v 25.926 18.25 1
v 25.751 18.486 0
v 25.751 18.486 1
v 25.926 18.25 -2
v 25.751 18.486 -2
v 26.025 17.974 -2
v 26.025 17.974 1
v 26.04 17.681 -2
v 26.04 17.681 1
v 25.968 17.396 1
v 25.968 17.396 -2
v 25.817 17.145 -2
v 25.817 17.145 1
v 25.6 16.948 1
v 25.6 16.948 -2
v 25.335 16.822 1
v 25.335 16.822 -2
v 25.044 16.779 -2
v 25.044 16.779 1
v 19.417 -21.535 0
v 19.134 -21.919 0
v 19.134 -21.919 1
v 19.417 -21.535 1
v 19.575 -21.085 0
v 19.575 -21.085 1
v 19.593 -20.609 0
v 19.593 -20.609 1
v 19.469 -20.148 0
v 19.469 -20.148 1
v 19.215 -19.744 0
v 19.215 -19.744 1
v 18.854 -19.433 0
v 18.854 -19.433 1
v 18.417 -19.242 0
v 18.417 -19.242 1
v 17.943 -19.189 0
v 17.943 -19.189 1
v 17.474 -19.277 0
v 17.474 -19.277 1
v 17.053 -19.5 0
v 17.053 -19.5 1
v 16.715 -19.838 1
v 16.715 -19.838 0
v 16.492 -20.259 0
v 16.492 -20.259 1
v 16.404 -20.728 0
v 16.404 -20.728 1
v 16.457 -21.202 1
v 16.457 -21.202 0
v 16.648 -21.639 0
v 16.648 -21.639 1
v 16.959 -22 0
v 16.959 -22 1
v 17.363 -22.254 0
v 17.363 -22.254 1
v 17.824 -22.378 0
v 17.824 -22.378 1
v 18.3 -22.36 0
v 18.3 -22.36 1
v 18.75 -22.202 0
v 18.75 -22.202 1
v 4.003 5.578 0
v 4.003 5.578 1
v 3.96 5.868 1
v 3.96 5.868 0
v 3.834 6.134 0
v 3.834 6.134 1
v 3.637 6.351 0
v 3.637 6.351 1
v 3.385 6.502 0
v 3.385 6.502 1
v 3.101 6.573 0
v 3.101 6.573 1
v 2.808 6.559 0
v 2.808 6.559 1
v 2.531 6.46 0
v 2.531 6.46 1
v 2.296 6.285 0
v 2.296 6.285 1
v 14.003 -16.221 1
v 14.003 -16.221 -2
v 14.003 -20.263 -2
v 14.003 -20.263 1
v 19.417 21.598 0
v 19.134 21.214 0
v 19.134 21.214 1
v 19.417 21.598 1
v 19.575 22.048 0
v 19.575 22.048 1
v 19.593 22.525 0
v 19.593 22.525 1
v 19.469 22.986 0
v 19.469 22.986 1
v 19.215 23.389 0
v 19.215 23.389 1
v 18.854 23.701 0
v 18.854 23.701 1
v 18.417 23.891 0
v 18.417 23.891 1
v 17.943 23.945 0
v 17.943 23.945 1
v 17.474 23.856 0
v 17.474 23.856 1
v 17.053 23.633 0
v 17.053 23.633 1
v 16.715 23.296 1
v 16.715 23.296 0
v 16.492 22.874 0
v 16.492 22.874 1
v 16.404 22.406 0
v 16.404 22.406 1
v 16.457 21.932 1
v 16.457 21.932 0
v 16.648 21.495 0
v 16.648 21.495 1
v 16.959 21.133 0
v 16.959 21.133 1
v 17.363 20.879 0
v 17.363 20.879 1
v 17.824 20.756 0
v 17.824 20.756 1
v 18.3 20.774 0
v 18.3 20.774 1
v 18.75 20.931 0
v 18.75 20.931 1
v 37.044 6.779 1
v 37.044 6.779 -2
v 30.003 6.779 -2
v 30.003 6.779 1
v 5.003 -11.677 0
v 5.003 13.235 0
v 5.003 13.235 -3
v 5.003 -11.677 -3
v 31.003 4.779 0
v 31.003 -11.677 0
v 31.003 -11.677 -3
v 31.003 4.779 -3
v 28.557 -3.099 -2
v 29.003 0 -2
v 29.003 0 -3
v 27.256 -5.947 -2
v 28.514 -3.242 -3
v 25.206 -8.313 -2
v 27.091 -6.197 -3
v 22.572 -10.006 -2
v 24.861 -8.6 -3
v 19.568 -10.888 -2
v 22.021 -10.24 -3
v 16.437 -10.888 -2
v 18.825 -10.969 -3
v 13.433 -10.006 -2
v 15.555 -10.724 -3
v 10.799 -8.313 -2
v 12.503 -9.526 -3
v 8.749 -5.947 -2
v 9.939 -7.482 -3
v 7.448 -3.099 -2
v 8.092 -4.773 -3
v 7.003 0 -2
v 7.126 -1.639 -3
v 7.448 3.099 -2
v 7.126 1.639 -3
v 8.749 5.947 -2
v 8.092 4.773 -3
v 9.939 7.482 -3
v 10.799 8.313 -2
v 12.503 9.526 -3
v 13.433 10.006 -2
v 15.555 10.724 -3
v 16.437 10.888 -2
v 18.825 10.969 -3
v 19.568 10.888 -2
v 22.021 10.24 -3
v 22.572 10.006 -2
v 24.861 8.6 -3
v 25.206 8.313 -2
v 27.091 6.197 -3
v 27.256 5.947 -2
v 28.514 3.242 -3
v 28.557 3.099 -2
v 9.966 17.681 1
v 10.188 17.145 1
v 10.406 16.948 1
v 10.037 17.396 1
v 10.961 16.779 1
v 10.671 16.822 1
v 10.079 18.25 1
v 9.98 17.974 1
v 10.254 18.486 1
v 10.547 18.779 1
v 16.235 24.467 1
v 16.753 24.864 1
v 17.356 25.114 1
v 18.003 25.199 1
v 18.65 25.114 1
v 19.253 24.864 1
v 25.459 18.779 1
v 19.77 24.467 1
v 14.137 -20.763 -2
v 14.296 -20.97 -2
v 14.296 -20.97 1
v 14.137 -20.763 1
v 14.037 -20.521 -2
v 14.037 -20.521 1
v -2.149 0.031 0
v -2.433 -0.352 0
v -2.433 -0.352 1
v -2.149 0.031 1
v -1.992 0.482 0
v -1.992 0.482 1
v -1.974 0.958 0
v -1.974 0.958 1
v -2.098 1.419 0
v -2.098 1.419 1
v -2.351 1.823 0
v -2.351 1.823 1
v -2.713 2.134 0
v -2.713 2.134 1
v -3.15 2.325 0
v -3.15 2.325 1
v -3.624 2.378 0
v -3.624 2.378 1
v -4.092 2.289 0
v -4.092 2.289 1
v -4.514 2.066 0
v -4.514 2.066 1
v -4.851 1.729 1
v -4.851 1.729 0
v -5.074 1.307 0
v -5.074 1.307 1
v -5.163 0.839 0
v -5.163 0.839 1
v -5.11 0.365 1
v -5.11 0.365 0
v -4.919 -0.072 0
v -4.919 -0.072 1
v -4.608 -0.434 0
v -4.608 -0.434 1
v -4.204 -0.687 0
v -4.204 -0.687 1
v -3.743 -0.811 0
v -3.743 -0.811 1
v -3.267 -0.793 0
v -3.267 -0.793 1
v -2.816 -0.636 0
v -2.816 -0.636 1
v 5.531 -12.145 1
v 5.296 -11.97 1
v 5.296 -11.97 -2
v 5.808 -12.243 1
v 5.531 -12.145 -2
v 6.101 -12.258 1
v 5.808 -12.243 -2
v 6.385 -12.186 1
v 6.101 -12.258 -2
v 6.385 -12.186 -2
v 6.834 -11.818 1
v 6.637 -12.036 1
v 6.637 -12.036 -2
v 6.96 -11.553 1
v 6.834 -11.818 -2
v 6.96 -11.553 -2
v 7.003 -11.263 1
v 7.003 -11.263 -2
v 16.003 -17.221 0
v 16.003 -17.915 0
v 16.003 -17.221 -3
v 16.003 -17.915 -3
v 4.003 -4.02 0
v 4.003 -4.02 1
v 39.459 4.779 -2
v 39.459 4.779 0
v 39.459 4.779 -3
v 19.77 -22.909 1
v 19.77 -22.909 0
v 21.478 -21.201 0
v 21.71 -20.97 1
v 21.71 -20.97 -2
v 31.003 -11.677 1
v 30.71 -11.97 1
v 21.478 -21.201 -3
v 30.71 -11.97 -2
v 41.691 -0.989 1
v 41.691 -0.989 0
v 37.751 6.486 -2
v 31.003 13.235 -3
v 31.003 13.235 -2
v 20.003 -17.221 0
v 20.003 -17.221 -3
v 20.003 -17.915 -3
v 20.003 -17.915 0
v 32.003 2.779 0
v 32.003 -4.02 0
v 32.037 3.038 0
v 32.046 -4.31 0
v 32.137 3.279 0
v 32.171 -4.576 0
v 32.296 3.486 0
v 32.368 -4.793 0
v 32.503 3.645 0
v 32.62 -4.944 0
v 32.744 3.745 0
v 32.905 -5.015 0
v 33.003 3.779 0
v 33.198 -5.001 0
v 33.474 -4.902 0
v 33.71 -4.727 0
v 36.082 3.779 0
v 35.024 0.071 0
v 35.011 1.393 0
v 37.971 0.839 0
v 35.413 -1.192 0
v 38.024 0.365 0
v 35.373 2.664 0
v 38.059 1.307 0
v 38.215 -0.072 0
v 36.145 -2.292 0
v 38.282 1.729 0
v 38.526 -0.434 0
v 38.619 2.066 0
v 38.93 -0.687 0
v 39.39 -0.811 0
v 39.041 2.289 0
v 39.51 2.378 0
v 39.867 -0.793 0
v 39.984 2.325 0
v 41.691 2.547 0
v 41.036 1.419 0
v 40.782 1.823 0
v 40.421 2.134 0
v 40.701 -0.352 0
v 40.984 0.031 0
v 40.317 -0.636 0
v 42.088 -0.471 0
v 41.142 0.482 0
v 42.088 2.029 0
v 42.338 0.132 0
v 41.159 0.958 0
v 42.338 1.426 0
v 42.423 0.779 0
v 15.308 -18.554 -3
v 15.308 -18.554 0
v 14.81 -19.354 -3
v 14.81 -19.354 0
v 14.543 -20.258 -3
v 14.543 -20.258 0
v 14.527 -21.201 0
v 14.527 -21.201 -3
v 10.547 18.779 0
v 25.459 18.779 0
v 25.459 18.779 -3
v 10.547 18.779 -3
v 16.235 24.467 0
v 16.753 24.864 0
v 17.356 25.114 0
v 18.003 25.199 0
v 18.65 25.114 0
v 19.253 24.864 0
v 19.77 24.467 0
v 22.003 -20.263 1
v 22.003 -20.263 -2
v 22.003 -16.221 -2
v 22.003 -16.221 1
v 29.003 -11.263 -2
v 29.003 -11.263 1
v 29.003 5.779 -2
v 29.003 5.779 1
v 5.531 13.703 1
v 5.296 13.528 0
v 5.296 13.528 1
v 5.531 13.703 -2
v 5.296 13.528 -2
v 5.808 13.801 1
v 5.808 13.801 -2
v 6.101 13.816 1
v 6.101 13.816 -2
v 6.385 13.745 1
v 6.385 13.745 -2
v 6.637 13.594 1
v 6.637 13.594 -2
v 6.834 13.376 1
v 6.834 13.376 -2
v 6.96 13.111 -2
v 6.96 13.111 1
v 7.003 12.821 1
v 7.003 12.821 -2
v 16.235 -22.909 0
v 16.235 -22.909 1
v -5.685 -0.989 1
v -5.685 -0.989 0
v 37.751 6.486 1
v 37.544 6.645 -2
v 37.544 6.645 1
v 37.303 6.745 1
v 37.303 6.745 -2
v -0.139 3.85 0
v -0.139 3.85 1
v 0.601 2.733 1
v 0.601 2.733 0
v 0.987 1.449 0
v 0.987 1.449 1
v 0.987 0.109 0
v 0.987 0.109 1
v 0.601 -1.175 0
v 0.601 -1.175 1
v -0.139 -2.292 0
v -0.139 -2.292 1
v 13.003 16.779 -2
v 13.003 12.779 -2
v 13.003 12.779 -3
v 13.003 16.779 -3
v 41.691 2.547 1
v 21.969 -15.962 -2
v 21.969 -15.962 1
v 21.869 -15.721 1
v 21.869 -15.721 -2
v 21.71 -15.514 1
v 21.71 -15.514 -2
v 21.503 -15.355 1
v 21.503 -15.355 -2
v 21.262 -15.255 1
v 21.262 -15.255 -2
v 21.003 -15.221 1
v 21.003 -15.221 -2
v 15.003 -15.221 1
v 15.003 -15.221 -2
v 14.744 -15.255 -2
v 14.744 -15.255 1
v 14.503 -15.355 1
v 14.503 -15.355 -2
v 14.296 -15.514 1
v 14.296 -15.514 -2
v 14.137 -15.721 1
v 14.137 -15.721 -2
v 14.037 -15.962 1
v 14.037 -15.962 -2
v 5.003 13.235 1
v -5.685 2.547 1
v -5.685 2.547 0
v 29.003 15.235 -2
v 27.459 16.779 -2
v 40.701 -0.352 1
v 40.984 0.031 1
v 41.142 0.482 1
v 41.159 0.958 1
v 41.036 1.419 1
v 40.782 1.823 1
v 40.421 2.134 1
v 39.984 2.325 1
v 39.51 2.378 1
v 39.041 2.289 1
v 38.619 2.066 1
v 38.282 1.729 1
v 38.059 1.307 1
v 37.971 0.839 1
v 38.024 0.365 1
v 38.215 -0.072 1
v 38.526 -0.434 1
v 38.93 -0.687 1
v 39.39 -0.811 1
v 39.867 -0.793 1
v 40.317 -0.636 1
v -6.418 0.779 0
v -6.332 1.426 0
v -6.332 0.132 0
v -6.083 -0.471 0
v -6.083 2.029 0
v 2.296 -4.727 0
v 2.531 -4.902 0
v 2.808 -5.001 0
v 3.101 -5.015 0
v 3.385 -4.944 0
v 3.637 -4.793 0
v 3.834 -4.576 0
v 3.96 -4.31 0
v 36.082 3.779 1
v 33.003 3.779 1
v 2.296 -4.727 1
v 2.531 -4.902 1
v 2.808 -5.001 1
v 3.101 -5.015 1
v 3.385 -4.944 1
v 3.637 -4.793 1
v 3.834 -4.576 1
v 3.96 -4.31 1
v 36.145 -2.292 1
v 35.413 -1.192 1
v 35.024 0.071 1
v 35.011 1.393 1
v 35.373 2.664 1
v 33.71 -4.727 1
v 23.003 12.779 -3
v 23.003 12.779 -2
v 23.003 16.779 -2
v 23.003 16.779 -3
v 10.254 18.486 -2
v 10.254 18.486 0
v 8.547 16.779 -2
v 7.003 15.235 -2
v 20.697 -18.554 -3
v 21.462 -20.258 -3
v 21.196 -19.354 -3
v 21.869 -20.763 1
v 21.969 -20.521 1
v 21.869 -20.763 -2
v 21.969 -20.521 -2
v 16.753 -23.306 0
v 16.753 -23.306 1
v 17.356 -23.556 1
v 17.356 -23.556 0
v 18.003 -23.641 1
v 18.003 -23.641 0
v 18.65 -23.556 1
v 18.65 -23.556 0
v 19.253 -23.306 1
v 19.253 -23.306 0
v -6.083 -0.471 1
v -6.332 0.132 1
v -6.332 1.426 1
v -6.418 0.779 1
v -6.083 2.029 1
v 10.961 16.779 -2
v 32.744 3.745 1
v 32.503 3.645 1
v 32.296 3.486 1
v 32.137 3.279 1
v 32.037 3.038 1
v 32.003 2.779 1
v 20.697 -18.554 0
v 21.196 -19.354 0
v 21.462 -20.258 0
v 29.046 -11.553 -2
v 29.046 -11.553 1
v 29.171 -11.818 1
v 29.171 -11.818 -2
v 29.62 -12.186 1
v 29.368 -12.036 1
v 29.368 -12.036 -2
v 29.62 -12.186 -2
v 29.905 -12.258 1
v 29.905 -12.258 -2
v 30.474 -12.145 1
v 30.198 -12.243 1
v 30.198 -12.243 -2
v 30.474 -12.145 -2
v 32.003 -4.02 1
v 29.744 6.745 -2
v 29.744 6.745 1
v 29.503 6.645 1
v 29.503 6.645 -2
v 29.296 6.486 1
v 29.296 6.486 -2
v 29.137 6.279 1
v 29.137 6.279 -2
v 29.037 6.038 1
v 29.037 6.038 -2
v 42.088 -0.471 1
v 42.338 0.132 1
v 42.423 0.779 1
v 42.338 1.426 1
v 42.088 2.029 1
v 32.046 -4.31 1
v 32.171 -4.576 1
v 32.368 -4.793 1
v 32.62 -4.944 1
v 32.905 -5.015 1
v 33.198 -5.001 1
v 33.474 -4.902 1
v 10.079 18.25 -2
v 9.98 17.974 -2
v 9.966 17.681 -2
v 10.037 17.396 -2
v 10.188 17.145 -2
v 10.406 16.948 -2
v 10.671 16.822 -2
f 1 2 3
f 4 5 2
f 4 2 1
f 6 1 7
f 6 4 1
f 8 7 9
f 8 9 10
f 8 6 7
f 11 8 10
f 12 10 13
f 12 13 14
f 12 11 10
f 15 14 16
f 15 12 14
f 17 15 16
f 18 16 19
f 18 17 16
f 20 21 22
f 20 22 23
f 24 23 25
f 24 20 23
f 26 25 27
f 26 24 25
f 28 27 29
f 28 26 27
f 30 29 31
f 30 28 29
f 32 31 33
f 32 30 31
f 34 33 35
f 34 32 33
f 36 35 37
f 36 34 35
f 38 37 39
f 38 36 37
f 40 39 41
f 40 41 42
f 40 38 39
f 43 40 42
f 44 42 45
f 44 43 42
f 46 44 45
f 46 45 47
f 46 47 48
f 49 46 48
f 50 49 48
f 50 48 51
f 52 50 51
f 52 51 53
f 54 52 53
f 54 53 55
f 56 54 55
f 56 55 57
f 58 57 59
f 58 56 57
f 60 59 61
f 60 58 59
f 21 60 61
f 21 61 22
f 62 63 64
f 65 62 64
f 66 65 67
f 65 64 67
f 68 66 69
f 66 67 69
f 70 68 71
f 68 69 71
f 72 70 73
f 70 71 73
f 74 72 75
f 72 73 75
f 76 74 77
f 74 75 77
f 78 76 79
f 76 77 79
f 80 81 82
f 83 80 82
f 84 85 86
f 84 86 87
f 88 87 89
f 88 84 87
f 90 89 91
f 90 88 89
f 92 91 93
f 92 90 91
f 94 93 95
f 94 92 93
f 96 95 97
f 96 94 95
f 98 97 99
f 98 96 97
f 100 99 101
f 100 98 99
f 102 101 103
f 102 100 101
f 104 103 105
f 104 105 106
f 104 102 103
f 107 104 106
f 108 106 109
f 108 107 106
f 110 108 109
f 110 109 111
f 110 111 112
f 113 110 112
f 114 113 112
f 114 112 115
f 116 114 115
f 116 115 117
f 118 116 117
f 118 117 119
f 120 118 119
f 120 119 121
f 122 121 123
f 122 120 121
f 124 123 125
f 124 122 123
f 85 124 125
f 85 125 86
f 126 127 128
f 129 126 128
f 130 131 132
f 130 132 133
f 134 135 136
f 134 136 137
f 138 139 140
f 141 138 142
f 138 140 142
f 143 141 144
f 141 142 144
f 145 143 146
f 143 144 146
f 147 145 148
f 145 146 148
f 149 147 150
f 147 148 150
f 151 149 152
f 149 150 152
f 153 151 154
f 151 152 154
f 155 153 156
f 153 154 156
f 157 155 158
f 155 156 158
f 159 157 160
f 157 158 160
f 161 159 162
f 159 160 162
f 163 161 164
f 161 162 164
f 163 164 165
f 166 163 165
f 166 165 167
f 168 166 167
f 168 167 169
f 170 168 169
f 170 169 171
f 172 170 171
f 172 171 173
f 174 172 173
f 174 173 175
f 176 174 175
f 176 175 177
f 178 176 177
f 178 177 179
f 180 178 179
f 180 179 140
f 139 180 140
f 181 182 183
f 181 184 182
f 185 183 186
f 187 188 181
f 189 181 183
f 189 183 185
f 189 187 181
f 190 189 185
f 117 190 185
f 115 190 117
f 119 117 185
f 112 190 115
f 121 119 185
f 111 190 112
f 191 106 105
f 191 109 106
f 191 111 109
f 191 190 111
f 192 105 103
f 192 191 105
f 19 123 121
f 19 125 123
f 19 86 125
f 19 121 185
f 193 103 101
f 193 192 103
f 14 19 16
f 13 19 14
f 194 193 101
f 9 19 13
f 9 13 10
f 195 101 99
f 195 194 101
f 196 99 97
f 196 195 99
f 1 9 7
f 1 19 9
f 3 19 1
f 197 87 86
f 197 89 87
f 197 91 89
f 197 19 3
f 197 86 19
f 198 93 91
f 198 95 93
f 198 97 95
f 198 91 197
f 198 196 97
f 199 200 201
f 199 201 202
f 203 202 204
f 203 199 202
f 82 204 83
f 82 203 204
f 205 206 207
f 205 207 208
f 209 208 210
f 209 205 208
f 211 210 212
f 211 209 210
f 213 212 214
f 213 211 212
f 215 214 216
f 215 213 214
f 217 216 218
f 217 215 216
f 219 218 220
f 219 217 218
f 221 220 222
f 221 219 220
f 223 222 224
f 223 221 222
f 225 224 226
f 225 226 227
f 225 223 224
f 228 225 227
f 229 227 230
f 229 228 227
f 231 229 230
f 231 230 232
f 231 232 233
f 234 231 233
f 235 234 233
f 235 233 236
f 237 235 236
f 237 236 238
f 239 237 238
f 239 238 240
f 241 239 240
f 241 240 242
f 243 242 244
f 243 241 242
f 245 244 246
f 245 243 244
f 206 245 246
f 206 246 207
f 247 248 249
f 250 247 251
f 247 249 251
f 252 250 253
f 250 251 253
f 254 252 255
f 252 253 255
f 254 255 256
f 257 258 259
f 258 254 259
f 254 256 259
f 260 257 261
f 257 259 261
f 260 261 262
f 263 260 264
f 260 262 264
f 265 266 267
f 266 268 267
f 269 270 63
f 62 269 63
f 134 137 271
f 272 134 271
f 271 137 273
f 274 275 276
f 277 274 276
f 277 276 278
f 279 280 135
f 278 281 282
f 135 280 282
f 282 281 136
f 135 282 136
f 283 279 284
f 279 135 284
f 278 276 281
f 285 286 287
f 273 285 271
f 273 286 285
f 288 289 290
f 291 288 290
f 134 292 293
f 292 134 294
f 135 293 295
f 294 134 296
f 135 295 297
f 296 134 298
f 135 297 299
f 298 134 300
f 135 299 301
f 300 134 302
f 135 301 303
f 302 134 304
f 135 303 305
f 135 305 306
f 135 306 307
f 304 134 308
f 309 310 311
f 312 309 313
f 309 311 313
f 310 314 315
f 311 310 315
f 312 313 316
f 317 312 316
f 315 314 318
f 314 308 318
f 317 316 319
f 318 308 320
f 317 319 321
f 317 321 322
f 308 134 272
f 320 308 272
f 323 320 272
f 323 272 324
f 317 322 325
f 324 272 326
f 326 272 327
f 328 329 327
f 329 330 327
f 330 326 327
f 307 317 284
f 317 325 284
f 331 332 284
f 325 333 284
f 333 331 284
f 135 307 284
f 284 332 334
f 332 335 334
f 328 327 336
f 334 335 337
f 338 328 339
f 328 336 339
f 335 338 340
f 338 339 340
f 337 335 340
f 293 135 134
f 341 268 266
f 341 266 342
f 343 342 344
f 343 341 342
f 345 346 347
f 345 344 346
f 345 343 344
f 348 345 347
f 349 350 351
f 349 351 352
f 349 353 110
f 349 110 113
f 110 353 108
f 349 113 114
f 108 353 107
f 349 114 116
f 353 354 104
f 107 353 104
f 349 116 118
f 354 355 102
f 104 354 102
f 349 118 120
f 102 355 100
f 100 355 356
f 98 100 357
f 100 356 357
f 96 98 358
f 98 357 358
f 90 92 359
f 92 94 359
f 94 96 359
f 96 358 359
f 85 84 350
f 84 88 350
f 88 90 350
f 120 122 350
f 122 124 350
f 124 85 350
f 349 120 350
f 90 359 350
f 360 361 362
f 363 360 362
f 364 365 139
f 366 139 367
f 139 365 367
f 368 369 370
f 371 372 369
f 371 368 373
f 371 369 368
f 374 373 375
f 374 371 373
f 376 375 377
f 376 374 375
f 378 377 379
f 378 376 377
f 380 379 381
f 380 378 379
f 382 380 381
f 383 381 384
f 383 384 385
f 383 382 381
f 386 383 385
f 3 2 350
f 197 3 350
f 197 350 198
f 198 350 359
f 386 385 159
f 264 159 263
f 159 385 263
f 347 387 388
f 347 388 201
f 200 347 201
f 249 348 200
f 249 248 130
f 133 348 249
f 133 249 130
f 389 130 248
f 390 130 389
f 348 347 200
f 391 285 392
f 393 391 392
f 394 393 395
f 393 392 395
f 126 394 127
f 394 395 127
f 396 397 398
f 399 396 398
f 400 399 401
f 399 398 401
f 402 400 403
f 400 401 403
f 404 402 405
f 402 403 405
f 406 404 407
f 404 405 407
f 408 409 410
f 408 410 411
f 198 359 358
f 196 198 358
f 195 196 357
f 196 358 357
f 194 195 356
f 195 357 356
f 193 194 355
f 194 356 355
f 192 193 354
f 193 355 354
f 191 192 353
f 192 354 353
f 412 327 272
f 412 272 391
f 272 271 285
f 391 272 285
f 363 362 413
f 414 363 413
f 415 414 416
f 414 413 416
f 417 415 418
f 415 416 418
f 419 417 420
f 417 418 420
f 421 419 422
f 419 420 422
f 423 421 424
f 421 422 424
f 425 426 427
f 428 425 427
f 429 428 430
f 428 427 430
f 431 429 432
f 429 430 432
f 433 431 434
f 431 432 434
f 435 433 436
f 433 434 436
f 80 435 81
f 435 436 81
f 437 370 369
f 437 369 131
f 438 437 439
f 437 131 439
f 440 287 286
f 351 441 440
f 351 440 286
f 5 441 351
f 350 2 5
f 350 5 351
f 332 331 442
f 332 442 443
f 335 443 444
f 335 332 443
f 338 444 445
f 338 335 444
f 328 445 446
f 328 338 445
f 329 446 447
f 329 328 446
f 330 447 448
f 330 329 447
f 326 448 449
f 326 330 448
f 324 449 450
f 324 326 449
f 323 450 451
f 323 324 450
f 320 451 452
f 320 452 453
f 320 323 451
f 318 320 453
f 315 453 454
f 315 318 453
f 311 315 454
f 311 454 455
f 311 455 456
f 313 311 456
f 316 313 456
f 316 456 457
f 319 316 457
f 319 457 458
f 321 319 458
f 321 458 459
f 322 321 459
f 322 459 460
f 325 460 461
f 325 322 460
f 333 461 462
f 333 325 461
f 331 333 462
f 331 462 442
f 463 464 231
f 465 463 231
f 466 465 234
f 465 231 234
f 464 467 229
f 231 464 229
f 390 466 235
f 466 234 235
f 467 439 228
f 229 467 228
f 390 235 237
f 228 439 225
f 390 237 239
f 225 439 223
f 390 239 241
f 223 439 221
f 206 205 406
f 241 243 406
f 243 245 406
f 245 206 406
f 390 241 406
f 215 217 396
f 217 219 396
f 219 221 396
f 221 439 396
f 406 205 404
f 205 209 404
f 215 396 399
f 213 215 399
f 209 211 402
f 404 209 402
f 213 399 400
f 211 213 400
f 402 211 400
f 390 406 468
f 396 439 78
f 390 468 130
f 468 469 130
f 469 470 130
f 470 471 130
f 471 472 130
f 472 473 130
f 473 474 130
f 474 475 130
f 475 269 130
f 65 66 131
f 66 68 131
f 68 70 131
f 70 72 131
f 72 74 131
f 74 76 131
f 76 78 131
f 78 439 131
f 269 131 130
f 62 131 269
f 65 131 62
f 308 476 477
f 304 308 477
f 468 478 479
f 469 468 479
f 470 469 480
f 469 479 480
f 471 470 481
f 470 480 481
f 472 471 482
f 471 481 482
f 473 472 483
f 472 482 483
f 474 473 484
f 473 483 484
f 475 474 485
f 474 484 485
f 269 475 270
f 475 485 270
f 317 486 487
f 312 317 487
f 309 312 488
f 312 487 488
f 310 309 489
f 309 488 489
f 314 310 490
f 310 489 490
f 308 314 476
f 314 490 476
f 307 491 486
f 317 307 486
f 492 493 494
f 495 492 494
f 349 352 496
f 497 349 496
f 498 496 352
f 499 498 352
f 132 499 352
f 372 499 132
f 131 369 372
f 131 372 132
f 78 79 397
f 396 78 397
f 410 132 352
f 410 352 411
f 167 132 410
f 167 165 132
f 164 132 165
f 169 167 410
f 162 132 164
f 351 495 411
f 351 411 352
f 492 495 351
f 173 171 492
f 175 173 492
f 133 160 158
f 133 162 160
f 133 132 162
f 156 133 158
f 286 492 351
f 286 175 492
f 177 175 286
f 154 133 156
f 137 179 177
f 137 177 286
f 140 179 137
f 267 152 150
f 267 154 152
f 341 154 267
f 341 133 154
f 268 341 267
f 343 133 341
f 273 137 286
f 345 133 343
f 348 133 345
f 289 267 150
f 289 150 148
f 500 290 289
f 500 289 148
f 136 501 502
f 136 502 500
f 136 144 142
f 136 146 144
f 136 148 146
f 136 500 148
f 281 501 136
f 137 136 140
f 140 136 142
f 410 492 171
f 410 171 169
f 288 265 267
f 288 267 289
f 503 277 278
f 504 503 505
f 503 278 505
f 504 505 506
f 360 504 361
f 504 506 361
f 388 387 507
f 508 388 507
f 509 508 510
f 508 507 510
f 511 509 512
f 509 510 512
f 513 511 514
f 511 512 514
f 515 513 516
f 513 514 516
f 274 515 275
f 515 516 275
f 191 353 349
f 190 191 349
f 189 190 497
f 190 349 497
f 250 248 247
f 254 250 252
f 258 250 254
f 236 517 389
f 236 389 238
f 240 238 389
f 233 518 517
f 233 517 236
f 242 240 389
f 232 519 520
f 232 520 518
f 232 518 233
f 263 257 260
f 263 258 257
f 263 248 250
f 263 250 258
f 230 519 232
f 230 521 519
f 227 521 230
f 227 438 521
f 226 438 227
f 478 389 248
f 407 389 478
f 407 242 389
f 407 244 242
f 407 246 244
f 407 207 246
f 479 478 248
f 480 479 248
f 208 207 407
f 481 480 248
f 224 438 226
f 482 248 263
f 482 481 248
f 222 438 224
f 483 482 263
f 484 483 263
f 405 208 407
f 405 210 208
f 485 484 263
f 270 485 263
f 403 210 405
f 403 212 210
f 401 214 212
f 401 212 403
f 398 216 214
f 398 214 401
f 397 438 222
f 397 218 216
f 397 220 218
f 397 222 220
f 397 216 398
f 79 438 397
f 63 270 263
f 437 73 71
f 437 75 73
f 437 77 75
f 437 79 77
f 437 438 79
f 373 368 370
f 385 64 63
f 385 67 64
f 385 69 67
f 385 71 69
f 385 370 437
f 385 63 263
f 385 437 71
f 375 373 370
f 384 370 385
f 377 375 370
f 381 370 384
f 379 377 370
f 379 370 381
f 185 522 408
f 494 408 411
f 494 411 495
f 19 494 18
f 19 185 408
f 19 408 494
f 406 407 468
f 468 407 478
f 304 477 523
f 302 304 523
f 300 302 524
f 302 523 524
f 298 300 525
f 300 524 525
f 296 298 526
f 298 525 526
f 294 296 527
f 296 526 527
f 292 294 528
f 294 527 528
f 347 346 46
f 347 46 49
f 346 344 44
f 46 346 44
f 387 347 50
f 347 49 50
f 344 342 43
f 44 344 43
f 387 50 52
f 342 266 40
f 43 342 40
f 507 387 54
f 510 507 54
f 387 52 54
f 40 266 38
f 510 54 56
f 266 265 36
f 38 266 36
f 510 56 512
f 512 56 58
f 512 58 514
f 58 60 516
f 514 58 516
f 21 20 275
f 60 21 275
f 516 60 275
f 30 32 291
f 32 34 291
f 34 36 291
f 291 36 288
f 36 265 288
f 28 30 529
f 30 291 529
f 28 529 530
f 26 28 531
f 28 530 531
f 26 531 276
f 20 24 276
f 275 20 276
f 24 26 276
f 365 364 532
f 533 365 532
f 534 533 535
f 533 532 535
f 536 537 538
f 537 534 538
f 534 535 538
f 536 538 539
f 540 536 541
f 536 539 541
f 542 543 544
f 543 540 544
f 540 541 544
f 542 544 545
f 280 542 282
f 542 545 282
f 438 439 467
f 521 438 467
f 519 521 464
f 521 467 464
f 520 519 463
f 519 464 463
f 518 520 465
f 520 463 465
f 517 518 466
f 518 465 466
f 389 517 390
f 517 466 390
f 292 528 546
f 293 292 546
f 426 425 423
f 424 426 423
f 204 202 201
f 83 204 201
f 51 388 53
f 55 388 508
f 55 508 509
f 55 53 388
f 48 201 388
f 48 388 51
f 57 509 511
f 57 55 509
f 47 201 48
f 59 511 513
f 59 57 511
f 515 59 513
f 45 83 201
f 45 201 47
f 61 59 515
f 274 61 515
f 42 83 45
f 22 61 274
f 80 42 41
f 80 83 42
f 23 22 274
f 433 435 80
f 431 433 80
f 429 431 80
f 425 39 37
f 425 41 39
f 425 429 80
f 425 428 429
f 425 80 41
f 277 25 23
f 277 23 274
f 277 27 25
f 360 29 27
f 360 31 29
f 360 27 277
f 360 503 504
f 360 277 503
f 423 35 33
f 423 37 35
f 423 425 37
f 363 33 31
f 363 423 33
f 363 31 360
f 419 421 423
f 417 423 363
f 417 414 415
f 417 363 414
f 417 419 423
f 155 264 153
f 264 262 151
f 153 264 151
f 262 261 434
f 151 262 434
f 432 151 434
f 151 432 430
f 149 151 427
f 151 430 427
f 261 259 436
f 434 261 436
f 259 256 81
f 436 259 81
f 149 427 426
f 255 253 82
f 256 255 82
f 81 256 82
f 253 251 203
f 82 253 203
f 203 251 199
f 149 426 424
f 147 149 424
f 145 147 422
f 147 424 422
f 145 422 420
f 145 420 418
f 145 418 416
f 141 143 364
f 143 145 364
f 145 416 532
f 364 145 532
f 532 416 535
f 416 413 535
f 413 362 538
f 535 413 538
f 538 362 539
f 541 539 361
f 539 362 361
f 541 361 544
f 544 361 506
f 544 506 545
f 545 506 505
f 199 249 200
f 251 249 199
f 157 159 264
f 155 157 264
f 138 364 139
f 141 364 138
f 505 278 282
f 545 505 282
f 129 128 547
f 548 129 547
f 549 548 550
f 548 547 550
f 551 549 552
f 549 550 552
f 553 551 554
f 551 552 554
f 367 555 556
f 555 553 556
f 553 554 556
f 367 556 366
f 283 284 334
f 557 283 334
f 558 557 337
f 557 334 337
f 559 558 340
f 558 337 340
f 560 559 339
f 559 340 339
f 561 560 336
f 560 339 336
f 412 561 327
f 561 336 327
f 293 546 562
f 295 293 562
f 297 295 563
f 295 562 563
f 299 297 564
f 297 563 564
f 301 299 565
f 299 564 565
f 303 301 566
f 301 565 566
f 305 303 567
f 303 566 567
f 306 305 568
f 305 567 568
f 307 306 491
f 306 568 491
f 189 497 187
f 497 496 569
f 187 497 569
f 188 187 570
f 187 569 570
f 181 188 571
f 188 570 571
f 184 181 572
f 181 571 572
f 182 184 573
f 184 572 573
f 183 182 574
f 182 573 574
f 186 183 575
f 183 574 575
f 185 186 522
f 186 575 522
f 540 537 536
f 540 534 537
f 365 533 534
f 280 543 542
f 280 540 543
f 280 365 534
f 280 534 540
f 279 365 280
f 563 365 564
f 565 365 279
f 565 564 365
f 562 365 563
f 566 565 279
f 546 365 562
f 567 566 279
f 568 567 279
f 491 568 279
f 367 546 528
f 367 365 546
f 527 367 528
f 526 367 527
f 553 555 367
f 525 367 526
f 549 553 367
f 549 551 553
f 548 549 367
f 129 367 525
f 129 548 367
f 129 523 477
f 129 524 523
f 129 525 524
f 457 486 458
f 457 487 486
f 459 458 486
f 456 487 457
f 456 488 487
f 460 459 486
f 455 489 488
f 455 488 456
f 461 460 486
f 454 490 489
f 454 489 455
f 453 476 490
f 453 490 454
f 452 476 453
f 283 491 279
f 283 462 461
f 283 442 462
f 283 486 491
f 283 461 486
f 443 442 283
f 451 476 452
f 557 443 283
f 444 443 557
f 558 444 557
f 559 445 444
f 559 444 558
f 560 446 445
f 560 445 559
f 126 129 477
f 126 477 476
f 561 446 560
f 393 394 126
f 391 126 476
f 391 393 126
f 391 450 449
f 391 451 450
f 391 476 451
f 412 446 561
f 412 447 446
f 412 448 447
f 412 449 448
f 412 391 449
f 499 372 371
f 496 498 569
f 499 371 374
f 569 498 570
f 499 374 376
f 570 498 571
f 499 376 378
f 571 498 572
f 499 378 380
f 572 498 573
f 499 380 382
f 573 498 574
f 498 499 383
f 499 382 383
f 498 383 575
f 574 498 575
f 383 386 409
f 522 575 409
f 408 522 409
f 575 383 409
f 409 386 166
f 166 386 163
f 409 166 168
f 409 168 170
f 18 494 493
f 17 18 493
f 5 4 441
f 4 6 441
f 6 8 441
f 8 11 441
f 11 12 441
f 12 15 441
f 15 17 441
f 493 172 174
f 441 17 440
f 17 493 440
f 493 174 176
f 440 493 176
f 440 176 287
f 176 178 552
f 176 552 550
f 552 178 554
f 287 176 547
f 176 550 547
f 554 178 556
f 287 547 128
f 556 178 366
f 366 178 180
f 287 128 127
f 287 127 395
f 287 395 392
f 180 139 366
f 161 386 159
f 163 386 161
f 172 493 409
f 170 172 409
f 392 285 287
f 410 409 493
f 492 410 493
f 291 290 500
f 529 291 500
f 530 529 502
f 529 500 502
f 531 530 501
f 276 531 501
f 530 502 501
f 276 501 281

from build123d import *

# Parameters (mm, degrees)
F0_R         = 1.6
F1_DEPTH     = 1
F2_ANGLE     = 45
F3_DEPTH     = 4
F5_DEPTH     = 3
F20_DEPTH    = 3
F7_R         = 11
F8_DEPTH     = 25
F9_DEPTH     = 3
F10_W        = 10
F10_H        = 4
F11_DEPTH    = 25
F13_DEPTH    = 25
F14_DEPTH    = 1
F15_DEPTH    = 2
F16_DEPTH    = 1
F17_DEPTH    = 2
F18_T1_DEPTH = 5.5
F18_T3_DEPTH = 9.0355339059
F18_T5_DEPTH = 4.0355339059


# Not quite as in the source:
# - a fillet or chamfer that OpenCascade refuses, or shapes differently, is made with other operations: its cross-section is extruded or revolved along the edge and cut away or added


with BuildPart() as f1:
    # F0 (on Top) → F1 (new body)
    with BuildSketch(Plane.XY):
        with BuildLine():
            Line((-14.7650561035, -22.9090262799), (16.2349438965, -22.9090262799))
            ThreePointArc((16.2349438965, -22.9090262799), (18.0027108495, -22.1767932329), (18.7349438965, -20.4090262799))
            Line((18.7349438965, -20.4090262799), (18.7349438965, 10.5909737201))
            ThreePointArc((18.7349438965, 10.5909737201), (18.0027108495, 12.3587406731), (16.2349438965, 13.0909737201))
            Line((16.2349438965, 13.0909737201), (-14.7650561035, 13.0909737201))
            ThreePointArc((-14.7650561035, 13.0909737201), (-16.5328230564, 12.3587406731), (-17.2650561035, 10.5909737201))
            Line((-17.2650561035, 10.5909737201), (-17.2650561035, -20.4090262799))
            ThreePointArc((-17.2650561035, -20.4090262799), (-16.5328230564, -22.1767932329), (-14.7650561035, -22.9090262799))
        make_face()
        with Locations((-14.5150561035, -20.1590262799)):
            Circle(F0_R, mode=Mode.SUBTRACT)
        with Locations((15.9849438965, -20.1590262799)):
            Circle(F0_R, mode=Mode.SUBTRACT)
        with Locations((-14.5150561035, 10.3409737201)):
            Circle(F0_R, mode=Mode.SUBTRACT)
        with Locations((15.9849438965, 10.3409737201)):
            Circle(F0_R, mode=Mode.SUBTRACT)
    extrude(amount=F1_DEPTH)


with BuildPart() as f1_1:
    # F2: moved
    add(f1.part.rotate(Axis((16.2349438965, -22.9090262799, 0.5), (0, 0, -1)), F2_ANGLE))

    # F19 (on face) → F3 (join)
    with BuildSketch(Plane.XY.offset(1)):
        Polygon((10.5468667268, -17.2209491102), (25.4585549722, -17.2209491102), (31.0027108495, -11.6767932329), (31.0027108495, 13.2348950126), (25.4585549722, 18.7790508898), (10.5468667268, 18.7790508898), (5.0027108495, 13.2348950126), (5.0027108495, -11.6767932329), align=None)
    extrude(amount=-F3_DEPTH)

    # F4 (on face) → F5 (cut)
    with BuildSketch(Plane.XY.offset(1)):
        Polygon((8.5468667268, -15.2209491102), (27.4585549722, -15.2209491102), (29.0027108495, -13.6767932329), (29.0027108495, 15.2348950126), (27.4585549722, 16.7790508898), (8.5468667268, 16.7790508898), (7.0027108495, 15.2348950126), (7.0027108495, -13.6767932329), align=None)
    extrude(amount=-F5_DEPTH, mode=Mode.SUBTRACT)

    # F6 (on face) → F20 (cut, through all)
    with BuildSketch(Plane.XY.offset(1)):
        Polygon((14.0027108495, -20.6767932329), (14.0027108495, -15.2209491102), (8.5468667268, -15.2209491102), align=None)
        Polygon((27.4585549722, -15.2209491102), (22.0027108495, -15.2209491102), (22.0027108495, -20.6767932329), align=None)
    extrude(amount=-F20_DEPTH, mode=Mode.SUBTRACT)

    # F7 (on face) → F8 (cut)
    with BuildSketch(Plane(origin=(0, 0, -3), x_dir=(1, 0, 0), z_dir=(0, 0, -1))):
        with Locations((18.0027108495, 0)):
            Circle(F7_R)
    extrude(amount=-F8_DEPTH, mode=Mode.SUBTRACT)

    # F21 (on face) → F9 (cut, through all)
    with BuildSketch(Plane.XY.offset(1)):
        Polygon((29.0027108495, 15.2348950126), (29.0027108495, 6.7790508898), (37.4585549722, 6.7790508898), align=None)
    extrude(amount=-F9_DEPTH, mode=Mode.SUBTRACT)

    # F10 (on face) → F11 (cut)
    with BuildSketch(Plane.XY.offset(-2)):
        with Locations((18.0027108495, 14.7790508898)):
            Rectangle(F10_W, F10_H)
    extrude(amount=-F11_DEPTH, mode=Mode.SUBTRACT)

    # F12 (on face) + F22 (on face) → F13 (cut)
    with BuildSketch(Plane.XY.offset(1)):
        with BuildLine():
            ThreePointArc((36.1448070539, -2.2920563414), (34.9697110872, 0.7317293655), (36.0823485209, 3.7790508898))
            Line((36.0823485209, 3.7790508898), (33.0027108495, 3.7790508898))
            ThreePointArc((33.0027108495, 3.7790508898), (32.2956040683, 3.486157671), (32.0027108495, 2.7790508898))
            Line((32.0027108495, 2.7790508898), (32.0027108495, -4.0199389834))
            ThreePointArc((32.0027108495, -4.0199389834), (32.6200274171, -4.9438185159), (33.7098176307, -4.7270457646))
            Line((33.7098176307, -4.7270457646), (36.1448070539, -2.2920563414))
        make_face()
    with BuildSketch(Plane.XY.offset(1)):
        with BuildLine():
            ThreePointArc((-0.1393853549, 3.8501581211), (1.0359540233, 0.7790508898), (-0.1393853549, -2.2920563414))
            Line((-0.1393853549, -2.2920563414), (2.2956040683, -4.7270457646))
            ThreePointArc((2.2956040683, -4.7270457646), (3.3853942819, -4.9438185159), (4.0027108495, -4.0199389834))
            Line((4.0027108495, -4.0199389834), (4.0027108495, 5.5780407631))
            ThreePointArc((4.0027108495, 5.5780407631), (3.3853942819, 6.5019202956), (2.2956040683, 6.2851475443))
            Line((2.2956040683, 6.2851475443), (-0.1393853549, 3.8501581211))
        make_face()
    extrude(amount=-F13_DEPTH, mode=Mode.SUBTRACT)

    # F23 (on face) → F14 (join, through all)
    with BuildSketch(Plane(origin=(0, 0, -3), x_dir=(1, 0, 0), z_dir=(0, 0, -1))):
        with BuildLine():
            Line((14.527236112, 21.2013184954), (10.5468667268, 17.2209491102))
            Line((10.5468667268, 17.2209491102), (16.0027108495, 17.2209491102))
            Line((16.0027108495, 17.2209491102), (16.0027108495, 17.9154246131))
            ThreePointArc((16.0027108495, 17.9154246131), (14.809831185, 19.3539976507), (14.527236112, 21.2013184954))
        make_face()
        with BuildLine():
            Line((20.0027108495, 17.9154246131), (20.0027108495, 17.2209491102))
            Line((20.0027108495, 17.2209491102), (25.4585549722, 17.2209491102))
            Line((25.4585549722, 17.2209491102), (21.478185587, 21.2013184954))
            ThreePointArc((21.478185587, 21.2013184954), (21.195590514, 19.3539976507), (20.0027108495, 17.9154246131))
        make_face()
    extrude(amount=-F14_DEPTH)

    # F24 (on face) → F15 (join, through all)
    with BuildSketch(Plane.XY.offset(-2)):
        with BuildLine():
            Line((22.0027108495, -20.6767932329), (22.0027108495, -17.2209491102))
            Line((22.0027108495, -17.2209491102), (20.0027108495, -17.2209491102))
            Line((20.0027108495, -17.2209491102), (20.0027108495, -17.9154246131))
            ThreePointArc((20.0027108495, -17.9154246131), (21.195590514, -19.3539976507), (21.478185587, -21.2013184954))
            Line((21.478185587, -21.2013184954), (22.0027108495, -20.6767932329))
        make_face()
        with BuildLine():
            Line((16.0027108495, -17.2209491102), (14.0027108495, -17.2209491102))
            Line((14.0027108495, -17.2209491102), (14.0027108495, -20.6767932329))
            Line((14.0027108495, -20.6767932329), (14.527236112, -21.2013184954))
            ThreePointArc((14.527236112, -21.2013184954), (14.809831185, -19.3539976507), (16.0027108495, -17.9154246131))
            Line((16.0027108495, -17.9154246131), (16.0027108495, -17.2209491102))
        make_face()
    extrude(amount=F15_DEPTH)

    # F25 (on face) → F16 (join, through all)
    with BuildSketch(Plane(origin=(0, 0, -3), x_dir=(1, 0, 0), z_dir=(0, 0, -1))):
        Polygon((31.0027108495, -4.7790508898), (31.0027108495, -13.2348950126), (39.4585549722, -4.7790508898), align=None)
    extrude(amount=-F16_DEPTH)

    # F26 (on face) → F17 (join, through all)
    with BuildSketch(Plane.XY.offset(-2)):
        Polygon((37.4585549722, 6.7790508898), (31.0027108495, 6.7790508898), (31.0027108495, 4.7790508898), (39.4585549722, 4.7790508898), align=None)
    extrude(amount=F17_DEPTH)

    # F18: fillet of radius 1 on 11 edges, made by hand

    # F18_s2 → F18_t1 (cut)
    with BuildSketch(Plane.XY.offset(-2)):
        with BuildLine():
            ThreePointArc((22.0027108495, -16.2209491102), (21.7098176307, -15.513842329), (21.0027108495, -15.2209491102))
            Line((21.0027108495, -15.2209491102), (22.0027108495, -15.2209491102))
            Line((22.0027108495, -15.2209491102), (22.0027108495, -16.2209491102))
        make_face()
        with BuildLine():
            ThreePointArc((15.0027108495, -15.2209491102), (14.2956040683, -15.513842329), (14.0027108495, -16.2209491102))
            Line((14.0027108495, -16.2209491102), (14.0027108495, -15.2209491102))
            Line((14.0027108495, -15.2209491102), (15.0027108495, -15.2209491102))
        make_face()
        with BuildLine():
            ThreePointArc((30.0027108495, 6.7790508898), (29.2956040683, 6.486157671), (29.0027108495, 5.7790508898))
            Line((29.0027108495, 5.7790508898), (29.0027108495, 6.7790508898))
            Line((29.0027108495, 6.7790508898), (30.0027108495, 6.7790508898))
        make_face()
    extrude(amount=F18_T1_DEPTH, mode=Mode.SUBTRACT)

    # F18_s4 → F18_t3 (cut)
    with BuildSketch(Plane.XY.offset(-2)):
        with BuildLine():
            ThreePointArc((5.2956040683, -11.9696864517), (6.3853942819, -12.186459203), (7.0027108495, -11.2625796705))
            Line((7.0027108495, -11.2625796705), (7.0027108495, -13.6767932329))
            Line((7.0027108495, -13.6767932329), (5.2956040683, -11.9696864517))
        make_face()
        with BuildLine():
            ThreePointArc((5.2956040683, 13.5277882314), (6.3853942819, 13.7445609827), (7.0027108495, 12.8206814502))
            Line((7.0027108495, 12.8206814502), (7.0027108495, 15.2348950126))
            Line((7.0027108495, 15.2348950126), (5.2956040683, 13.5277882314))
        make_face()
        with BuildLine():
            ThreePointArc((29.0027108495, -11.2625796705), (29.6200274171, -12.186459203), (30.7098176307, -11.9696864517))
            Line((30.7098176307, -11.9696864517), (29.0027108495, -13.6767932329))
            Line((29.0027108495, -13.6767932329), (29.0027108495, -11.2625796705))
        make_face()
        with BuildLine():
            ThreePointArc((10.253973508, 18.486157671), (10.0372007566, 17.3963674575), (10.9610802892, 16.7790508898))
            Line((10.9610802892, 16.7790508898), (8.5468667268, 16.7790508898))
            Line((8.5468667268, 16.7790508898), (10.253973508, 18.486157671))
        make_face()
        with BuildLine():
            ThreePointArc((25.751448191, 18.486157671), (25.9682209424, 17.3963674575), (25.0443414098, 16.7790508898))
            Line((25.0443414098, 16.7790508898), (27.4585549722, 16.7790508898))
            Line((27.4585549722, 16.7790508898), (25.751448191, 18.486157671))
        make_face()
    extrude(amount=F18_T3_DEPTH, mode=Mode.SUBTRACT)

    # F18_s6 → F18_t5 (cut)
    with BuildSketch(Plane.XY.offset(-2)):
        with BuildLine():
            ThreePointArc((14.2956040683, -20.9696864517), (14.078831317, -20.6452631029), (14.0027108495, -20.2625796705))
            Line((14.0027108495, -20.2625796705), (14.0027108495, -20.6767932329))
            Line((14.0027108495, -20.6767932329), (14.2956040683, -20.9696864517))
        make_face()
        with BuildLine():
            ThreePointArc((21.7098176307, -20.9696864517), (21.926590382, -20.6452631029), (22.0027108495, -20.2625796705))
            Line((22.0027108495, -20.2625796705), (22.0027108495, -20.6767932329))
            Line((22.0027108495, -20.6767932329), (21.7098176307, -20.9696864517))
        make_face()
        with BuildLine():
            ThreePointArc((37.751448191, 6.486157671), (37.4270248422, 6.7029304224), (37.0443414098, 6.7790508898))
            Line((37.0443414098, 6.7790508898), (37.4585549722, 6.7790508898))
            Line((37.4585549722, 6.7790508898), (37.751448191, 6.486157671))
        make_face()
    extrude(amount=F18_T5_DEPTH, mode=Mode.SUBTRACT)


solid = f1_1.part
